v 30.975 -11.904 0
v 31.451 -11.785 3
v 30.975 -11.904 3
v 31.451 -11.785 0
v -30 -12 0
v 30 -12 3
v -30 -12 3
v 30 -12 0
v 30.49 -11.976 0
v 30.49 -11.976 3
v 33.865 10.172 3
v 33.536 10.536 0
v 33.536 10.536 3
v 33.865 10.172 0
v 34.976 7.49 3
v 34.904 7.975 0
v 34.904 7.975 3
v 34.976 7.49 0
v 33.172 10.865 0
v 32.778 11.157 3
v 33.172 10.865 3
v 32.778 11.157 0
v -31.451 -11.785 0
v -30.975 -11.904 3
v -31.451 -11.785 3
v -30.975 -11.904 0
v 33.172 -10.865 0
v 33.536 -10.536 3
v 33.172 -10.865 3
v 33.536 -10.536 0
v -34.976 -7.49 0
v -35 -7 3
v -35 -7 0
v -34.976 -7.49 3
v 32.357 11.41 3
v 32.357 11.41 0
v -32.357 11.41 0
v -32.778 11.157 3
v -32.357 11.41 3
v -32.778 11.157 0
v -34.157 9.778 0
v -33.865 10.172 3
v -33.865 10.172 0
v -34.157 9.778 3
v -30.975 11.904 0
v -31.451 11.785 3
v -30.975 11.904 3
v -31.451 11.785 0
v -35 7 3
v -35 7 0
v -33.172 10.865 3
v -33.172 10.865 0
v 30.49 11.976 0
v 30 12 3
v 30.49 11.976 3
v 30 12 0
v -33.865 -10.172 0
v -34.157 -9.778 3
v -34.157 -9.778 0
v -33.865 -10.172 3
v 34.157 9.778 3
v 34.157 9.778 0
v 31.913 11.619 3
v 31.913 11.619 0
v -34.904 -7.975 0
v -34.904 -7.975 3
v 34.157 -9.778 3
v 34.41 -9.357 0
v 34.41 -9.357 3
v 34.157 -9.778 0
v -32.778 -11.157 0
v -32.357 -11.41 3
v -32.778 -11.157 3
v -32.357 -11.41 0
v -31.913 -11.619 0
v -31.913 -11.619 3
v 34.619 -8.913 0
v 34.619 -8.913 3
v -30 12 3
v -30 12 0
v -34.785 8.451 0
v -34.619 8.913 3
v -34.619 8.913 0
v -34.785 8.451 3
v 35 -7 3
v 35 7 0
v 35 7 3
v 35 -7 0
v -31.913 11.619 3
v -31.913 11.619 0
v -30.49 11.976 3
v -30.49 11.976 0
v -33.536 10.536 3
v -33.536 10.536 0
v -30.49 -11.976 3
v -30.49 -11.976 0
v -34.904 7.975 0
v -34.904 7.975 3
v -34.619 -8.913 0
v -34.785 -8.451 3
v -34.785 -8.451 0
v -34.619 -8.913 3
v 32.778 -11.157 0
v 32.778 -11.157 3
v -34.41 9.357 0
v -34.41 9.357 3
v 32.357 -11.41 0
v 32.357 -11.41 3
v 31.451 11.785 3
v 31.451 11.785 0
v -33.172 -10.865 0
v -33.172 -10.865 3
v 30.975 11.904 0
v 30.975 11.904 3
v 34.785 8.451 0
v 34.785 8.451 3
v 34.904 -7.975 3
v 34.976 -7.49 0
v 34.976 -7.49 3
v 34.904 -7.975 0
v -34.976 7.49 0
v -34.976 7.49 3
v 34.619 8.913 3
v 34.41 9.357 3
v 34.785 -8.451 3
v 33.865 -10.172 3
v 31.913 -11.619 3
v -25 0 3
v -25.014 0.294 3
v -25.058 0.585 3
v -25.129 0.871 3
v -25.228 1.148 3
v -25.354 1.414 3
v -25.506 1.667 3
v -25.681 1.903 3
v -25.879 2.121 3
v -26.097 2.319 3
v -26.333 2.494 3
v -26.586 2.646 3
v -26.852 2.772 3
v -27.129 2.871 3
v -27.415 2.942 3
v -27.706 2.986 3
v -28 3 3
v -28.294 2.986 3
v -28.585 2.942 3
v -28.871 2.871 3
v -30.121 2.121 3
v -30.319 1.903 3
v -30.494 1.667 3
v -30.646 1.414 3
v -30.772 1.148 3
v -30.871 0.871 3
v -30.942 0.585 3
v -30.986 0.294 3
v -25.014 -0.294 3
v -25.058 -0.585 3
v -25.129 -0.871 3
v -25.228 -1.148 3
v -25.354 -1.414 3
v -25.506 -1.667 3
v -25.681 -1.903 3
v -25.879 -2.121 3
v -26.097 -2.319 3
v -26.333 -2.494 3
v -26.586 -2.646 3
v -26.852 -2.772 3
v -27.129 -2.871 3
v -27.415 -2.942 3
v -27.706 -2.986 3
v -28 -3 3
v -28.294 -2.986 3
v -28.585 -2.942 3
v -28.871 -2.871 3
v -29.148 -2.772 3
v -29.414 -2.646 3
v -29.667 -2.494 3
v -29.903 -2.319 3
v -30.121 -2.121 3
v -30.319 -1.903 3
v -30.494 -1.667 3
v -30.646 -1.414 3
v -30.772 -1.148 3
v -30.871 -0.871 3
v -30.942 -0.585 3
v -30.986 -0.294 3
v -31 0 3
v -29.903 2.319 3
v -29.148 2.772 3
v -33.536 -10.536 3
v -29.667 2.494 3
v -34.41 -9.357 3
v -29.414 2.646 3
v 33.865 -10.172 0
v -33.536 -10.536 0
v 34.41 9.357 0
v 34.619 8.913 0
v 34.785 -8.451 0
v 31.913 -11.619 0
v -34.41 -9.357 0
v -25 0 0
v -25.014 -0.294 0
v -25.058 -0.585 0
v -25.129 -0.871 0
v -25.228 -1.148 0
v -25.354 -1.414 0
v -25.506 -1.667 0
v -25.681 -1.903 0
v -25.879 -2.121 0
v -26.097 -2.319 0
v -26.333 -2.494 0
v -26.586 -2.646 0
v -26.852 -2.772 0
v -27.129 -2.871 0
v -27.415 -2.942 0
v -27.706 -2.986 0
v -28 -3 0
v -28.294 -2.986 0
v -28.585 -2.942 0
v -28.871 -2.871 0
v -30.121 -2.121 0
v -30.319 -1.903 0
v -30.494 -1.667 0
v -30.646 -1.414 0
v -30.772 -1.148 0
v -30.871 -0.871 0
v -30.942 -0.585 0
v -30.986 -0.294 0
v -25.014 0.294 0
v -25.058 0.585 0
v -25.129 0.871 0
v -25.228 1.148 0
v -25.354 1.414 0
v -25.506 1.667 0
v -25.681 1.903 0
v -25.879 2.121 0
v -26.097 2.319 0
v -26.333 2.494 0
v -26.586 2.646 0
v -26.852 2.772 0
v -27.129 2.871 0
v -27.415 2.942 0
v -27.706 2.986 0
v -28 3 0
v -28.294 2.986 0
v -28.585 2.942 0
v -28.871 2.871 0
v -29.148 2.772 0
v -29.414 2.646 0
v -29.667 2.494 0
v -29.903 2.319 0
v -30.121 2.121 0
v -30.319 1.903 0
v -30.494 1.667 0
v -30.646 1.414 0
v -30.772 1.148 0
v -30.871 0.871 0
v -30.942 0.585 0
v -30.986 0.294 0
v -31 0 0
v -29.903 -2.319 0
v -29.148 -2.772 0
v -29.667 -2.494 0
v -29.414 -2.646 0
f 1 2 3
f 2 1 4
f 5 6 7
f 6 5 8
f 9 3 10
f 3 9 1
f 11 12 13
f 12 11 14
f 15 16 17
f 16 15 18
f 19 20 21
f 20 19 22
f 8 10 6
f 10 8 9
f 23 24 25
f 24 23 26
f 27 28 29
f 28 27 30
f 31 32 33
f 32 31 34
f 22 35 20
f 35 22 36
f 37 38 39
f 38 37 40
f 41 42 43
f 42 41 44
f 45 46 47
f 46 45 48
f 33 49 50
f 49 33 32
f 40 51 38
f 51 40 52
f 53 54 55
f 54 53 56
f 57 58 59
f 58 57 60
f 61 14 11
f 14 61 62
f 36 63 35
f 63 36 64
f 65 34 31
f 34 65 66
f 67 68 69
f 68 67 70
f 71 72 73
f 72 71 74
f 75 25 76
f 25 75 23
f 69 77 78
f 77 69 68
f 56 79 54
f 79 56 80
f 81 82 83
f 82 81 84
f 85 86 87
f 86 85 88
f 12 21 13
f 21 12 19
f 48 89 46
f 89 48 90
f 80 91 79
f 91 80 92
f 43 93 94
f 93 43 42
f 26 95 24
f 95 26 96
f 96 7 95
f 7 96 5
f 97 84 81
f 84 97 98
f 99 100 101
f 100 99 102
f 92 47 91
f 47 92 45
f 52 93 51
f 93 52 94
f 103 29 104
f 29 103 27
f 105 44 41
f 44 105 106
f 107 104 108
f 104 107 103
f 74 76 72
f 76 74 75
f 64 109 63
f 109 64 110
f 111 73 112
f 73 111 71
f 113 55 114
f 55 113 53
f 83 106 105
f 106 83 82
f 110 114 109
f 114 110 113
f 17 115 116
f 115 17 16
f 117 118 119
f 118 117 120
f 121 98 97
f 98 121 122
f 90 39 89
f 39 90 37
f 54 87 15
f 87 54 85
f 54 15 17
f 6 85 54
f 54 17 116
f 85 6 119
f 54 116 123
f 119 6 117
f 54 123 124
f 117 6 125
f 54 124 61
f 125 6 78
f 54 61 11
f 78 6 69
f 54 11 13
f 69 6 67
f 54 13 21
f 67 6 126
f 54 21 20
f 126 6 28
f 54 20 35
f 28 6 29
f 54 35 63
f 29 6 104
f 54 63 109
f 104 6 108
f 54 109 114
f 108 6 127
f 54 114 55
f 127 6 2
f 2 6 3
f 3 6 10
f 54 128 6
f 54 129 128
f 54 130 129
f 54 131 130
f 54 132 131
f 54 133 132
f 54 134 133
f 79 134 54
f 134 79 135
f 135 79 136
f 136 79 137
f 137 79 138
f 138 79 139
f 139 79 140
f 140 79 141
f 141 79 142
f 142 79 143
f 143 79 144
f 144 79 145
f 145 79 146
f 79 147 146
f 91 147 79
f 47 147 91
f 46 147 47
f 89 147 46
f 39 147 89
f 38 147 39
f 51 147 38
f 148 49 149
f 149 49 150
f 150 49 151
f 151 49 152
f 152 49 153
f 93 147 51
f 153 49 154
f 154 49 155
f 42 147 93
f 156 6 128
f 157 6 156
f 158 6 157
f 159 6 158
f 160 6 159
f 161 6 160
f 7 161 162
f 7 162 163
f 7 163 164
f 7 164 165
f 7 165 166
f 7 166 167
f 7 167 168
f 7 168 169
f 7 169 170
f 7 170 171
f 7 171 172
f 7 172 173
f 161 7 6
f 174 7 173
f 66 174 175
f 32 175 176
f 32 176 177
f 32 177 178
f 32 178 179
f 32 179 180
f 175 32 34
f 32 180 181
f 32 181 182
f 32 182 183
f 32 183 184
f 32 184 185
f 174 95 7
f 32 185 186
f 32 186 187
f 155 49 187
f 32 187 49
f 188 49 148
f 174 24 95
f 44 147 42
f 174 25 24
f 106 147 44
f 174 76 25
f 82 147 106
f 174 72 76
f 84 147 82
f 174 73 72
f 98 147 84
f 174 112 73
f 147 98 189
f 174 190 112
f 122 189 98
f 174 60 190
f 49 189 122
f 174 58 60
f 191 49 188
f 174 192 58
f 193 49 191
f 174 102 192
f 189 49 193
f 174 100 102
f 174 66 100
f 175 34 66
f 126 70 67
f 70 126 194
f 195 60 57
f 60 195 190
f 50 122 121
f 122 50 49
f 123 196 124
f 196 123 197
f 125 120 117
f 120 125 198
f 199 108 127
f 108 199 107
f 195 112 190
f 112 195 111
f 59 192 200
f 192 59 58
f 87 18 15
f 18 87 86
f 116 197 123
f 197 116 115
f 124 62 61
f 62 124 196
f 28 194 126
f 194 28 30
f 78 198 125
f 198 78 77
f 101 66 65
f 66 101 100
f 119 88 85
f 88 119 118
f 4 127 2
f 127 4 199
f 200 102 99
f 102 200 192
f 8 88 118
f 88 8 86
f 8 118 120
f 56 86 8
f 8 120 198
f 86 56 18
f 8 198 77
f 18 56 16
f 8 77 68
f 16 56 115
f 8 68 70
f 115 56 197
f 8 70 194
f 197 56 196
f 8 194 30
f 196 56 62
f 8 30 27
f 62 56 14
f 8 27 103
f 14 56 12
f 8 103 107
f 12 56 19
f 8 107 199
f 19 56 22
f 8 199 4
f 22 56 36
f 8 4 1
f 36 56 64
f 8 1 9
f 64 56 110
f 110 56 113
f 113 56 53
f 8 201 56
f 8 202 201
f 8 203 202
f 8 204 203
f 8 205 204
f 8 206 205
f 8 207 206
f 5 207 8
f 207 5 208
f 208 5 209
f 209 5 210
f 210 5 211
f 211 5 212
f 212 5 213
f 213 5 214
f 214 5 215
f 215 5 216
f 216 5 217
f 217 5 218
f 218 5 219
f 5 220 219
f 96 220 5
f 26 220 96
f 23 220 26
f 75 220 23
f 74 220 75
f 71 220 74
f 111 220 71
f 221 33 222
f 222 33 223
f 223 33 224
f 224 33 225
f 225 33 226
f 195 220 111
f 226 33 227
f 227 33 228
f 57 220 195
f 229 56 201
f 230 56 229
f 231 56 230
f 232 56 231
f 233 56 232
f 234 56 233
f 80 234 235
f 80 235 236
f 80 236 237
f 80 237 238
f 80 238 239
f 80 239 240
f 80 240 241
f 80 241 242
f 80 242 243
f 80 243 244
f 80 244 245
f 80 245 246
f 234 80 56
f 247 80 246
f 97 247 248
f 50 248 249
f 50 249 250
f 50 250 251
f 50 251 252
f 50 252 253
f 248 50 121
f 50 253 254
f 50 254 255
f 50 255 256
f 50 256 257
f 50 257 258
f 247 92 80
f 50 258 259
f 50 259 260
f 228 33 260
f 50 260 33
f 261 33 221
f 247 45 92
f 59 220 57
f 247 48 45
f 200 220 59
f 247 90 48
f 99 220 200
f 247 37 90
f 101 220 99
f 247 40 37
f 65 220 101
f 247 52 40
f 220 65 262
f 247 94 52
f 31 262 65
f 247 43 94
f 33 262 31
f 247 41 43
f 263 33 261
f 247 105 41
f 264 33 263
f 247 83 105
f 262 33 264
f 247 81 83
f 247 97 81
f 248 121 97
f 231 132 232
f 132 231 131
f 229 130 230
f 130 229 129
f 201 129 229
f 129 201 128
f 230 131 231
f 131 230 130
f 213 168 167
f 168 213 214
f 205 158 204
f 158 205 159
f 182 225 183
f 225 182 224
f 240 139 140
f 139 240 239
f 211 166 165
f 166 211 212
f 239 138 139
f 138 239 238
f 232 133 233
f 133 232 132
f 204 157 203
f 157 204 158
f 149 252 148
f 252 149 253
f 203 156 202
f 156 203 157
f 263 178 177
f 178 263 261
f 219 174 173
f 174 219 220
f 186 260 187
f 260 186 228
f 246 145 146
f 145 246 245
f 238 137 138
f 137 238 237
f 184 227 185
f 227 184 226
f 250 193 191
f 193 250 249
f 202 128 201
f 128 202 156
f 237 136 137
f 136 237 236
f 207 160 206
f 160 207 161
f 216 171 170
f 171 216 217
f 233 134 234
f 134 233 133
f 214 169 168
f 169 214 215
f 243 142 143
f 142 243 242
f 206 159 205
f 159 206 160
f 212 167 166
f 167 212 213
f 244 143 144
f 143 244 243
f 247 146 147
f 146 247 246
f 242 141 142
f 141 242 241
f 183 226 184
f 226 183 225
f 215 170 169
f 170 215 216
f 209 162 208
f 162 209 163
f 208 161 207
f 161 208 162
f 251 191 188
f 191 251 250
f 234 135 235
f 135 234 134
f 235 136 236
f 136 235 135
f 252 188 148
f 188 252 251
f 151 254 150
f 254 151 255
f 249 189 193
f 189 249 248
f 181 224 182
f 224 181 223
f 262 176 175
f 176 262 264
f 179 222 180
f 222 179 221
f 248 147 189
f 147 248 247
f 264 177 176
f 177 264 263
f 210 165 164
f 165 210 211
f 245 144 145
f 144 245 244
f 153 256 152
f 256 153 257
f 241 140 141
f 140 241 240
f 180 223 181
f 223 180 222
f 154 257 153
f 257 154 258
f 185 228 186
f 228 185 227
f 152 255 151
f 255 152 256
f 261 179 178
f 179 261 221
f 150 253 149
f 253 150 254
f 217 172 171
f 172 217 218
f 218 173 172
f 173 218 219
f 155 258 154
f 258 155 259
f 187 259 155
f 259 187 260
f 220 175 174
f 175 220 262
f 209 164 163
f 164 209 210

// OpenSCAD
// ============================================================
//  LuxeStyle - Grundplatte fuer MEHRFARBIGE Namens-Anhaenger
//  (fuer X1C + AMS). Text ist hier ABSICHTLICH nicht enthalten -
//  den setzt du in Bambu Studio mit dem Text-Werkzeug in einer
//  zweiten Farbe drauf (siehe README, Abschnitt "Mehrfarbig").
//
//  Einmal rendern, immer wiederverwenden:
//    openscad -o base.stl -D width=70 nametag_base.scad
// ============================================================

width       = 70;   // Plattenbreite in mm (genug fuer ~10 Zeichen)
height      = 24;   // Plattenhoehe in mm
plate_thick = 3;    // Dicke in mm
corner_r    = 5;    // Eckenradius in mm

ring_d      = 6;    // Aufhaenge-Loch-Durchmesser in mm
ring_margin = 7;    // Abstand des Lochs vom linken Rand in mm

$fn = 64;

module rounded_rect(w, h, r) {
    offset(r) offset(-r) square([w, h], center = true);
}

difference() {
    linear_extrude(plate_thick)
        rounded_rect(width, height, corner_r);
    translate([-width / 2 + ring_margin, 0, -1])
        cylinder(d = ring_d, h = plate_thick + 2);
}
